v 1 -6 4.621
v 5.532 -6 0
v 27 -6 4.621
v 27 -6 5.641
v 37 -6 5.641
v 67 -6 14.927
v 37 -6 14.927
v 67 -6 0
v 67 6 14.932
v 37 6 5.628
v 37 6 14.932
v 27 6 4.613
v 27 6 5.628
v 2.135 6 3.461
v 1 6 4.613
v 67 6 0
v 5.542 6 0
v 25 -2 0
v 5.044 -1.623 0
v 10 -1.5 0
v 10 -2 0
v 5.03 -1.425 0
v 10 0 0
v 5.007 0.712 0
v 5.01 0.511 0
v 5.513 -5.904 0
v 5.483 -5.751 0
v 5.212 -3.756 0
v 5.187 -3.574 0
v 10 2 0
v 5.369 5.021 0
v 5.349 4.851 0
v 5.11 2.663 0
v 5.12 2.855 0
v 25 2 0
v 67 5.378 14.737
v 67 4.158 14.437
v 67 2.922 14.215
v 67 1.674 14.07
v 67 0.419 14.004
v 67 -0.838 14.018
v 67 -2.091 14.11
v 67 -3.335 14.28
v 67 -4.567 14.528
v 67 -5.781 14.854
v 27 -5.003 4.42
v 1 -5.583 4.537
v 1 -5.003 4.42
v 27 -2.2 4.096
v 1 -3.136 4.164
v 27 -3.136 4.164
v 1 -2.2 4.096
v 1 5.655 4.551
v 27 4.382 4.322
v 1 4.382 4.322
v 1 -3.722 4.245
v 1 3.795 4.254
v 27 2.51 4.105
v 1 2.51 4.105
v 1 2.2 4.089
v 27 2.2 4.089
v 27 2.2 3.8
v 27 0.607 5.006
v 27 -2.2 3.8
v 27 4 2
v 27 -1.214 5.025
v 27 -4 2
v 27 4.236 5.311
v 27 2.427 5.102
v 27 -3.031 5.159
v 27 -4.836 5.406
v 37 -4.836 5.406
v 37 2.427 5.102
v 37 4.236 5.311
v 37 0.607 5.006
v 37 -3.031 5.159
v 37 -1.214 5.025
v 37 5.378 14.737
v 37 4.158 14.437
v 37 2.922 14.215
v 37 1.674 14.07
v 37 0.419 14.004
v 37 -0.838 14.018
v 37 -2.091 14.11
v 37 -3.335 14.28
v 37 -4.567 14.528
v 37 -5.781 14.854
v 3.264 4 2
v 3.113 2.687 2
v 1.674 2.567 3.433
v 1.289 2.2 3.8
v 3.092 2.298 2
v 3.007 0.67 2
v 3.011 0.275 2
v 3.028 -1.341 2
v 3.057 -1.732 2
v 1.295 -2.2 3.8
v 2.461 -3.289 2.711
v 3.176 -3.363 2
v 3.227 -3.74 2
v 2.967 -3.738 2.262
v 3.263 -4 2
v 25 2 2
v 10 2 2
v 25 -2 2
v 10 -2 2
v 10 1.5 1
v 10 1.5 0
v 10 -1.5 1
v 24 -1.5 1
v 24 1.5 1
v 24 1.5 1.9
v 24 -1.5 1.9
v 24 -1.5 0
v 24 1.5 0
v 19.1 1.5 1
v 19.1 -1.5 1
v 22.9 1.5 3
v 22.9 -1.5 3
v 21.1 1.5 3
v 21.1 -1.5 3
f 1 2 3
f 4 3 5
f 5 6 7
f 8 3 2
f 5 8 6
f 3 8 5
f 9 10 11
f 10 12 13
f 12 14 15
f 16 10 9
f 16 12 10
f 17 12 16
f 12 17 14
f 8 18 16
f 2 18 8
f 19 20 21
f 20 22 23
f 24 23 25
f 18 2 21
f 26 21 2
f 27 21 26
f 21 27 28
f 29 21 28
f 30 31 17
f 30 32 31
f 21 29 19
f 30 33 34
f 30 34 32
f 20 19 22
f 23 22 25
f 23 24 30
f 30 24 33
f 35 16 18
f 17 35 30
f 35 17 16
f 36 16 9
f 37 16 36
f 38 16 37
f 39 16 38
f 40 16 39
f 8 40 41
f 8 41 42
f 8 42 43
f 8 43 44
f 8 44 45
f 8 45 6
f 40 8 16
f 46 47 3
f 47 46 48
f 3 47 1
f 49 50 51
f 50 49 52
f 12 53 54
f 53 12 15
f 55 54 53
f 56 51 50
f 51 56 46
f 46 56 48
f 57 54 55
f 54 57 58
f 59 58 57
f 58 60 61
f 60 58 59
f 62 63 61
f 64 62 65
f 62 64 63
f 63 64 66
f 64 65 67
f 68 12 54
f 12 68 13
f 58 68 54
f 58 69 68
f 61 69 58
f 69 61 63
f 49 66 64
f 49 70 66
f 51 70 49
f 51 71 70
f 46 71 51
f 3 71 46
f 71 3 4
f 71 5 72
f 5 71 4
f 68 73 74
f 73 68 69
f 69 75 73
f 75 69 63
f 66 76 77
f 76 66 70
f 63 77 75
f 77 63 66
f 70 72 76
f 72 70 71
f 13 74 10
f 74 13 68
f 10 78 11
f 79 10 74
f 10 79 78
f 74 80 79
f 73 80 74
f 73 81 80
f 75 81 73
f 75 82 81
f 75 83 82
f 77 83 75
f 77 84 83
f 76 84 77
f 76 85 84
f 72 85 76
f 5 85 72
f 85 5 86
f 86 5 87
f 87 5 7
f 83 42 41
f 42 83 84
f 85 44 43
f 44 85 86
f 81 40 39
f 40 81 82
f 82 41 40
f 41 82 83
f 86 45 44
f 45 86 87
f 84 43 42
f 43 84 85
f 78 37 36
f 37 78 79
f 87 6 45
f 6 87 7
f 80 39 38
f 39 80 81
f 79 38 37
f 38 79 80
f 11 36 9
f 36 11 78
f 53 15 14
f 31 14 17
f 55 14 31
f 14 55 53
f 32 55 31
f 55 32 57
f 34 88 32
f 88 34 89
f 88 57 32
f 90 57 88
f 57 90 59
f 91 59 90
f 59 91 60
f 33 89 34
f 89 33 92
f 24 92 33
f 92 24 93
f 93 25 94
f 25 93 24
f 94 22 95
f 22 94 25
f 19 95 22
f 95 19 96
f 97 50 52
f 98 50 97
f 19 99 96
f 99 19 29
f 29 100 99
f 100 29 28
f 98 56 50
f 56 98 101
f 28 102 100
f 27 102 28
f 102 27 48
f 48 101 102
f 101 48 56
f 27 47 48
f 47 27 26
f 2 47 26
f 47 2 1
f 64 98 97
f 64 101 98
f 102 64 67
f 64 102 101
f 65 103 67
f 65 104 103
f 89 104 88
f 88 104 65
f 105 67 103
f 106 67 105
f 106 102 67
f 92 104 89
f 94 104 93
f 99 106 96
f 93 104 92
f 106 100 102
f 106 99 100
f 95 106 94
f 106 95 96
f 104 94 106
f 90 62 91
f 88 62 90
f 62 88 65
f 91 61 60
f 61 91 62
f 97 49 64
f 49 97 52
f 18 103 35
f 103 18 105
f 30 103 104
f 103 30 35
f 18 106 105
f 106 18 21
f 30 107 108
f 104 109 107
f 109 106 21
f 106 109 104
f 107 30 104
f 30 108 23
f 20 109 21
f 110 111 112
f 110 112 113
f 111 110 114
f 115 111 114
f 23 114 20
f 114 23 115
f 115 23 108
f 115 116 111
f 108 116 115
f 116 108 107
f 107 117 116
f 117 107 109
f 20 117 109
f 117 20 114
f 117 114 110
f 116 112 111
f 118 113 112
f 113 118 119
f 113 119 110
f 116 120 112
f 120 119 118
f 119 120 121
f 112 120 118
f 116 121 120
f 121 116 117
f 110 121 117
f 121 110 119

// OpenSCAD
// file: lib/camfer.scad
function reverse_list(list) = [ for (idx = [len(list) - 1 : -1 : 0]) list[idx] ];
function xmirror(list) = [ for ( e = list ) [-e[0], e[1]]];
function back_and_forth(list) = concat(list, reverse_list(xmirror(list)));


module circular_shape_camfer(radius, shape) {
	rotate_extrude($fn=100)
	translate([radius,0,0])
	polygon(shape);
}

module circular_camfer(radius, camfing, style, width = 10, height=10) {
	if (style == "circular") {
		difference () {
			translate([0,0,-30])
				cylinder(r = radius + camfing+30, h=camfing+30, $fn=100);
			translate([0,0,-31])
				cylinder(r = radius, h=camfing+32, $fn=100);
			translate([0,0,camfing])
				rotate_extrude($fn=100)
				translate([radius,0,0])
				circle(r=camfing, $fn=32);
		}
	}

	if (style == "triangular") {
		rotate_extrude($fn=100)
			translate([radius,0,0])
			rotate([0,0,-90-camfing])
			polygon([[-width,0],[width,0],[width,height],[-width,height]]);
	}
}
// file: lib/container.scad
use <threads.scad>;
use <camfer.scad>;


module lid(thread_height = 4) {
	difference () {
		union() {
			translate([0,0,1])
            difference() {
				metric_thread (diameter=55, pitch=2, length=thread_height+3, internal=false, n_starts=2);
                circular_camfer(25.5, 45, "triangular");
                translate([0,0,thread_height+3])
                circular_camfer(25.5, -45, "triangular");
            }
			cylinder(r=25.5, h=thread_height + 4, $fn=100);
		}

		translate([13,0,2])
			cylinder(r=10, h=thread_height + 3, $fn=100);
		rotate([0,0,120])
			translate([13,0,2])
			cylinder(r=10, h=thread_height + 3, $fn=100);
		rotate([0,0,-120])
			translate([13,0,2])
			cylinder(r=10, h=thread_height + 3, $fn=100);
	}
}


box();

module flange(inner_height = 30, thread_height = 4) {
	// Align to XY plane
	translate([0,0,34])
		rotate([0,90,0])
		rotate([0,0,-60])
	// The flange itself
	union() {
		difference() {
			// The stick
			rotate([0,0,-30])
				linear_extrude(height=inner_height+2+1+thread_height+40)
				translate([0,30,0])
				polygon(back_and_forth([[6,-20],[6,4]]));
	
			// Cutout for main housing
			translate([0,0,-1])
				cylinder(r=30, h=inner_height + 3 + thread_height + 1, $fn=100);
			// Cutout with room for lid
			translate([0,0,inner_height + 3 + thread_height - 1])
				cylinder(r=29, h=11, $fn=100);
			// Cutout for mast top
			translate([0,0,inner_height + 3 + thread_height + 10 - 1])
				cylinder(r=20, h=32, $fn=100);
			// Pretty at the bottom
			circular_camfer(radius=29, camfing=45, style="triangular");
	
			rotate([0,0,-30])
				linear_extrude(height=inner_height+2+1+thread_height)
				translate([0,30,0])
				polygon(back_and_forth([[2.2,-1],[2.2,0.2],[4,2]]));
	
			rotate([0,0,-30])
				translate([-2,34.5,inner_height+2 +3 -15])				
				rotate([90,0,0])
				linear_extrude(height=3)
				square([4,15]);
		}
	
		// Small flange for notch
		rotate([0,0,-30])
			translate([-1.5,34,inner_height+2 +3 -15])				
			rotate([90,0,0])
			linear_extrude(height=1)
			square([3,14]);
					
		// Notch
		rotate([0,0,60])
			translate([0,0,inner_height+2])			
			rotate([90,0,0])
			translate([30,0,0])
			linear_extrude(height=3, center=true)
			polygon([[1,-0.9], [1,0.9], [2.1,2], [3, 2], [3,-2.9]]);
	}
}

module box(inner_height = 30, thread_height = 4) {

nookCrossSection = [[0.5,0.5], [3,3], [3,-3], [0.5,-0.5]];

union() {
	difference() {
		union() {
			difference() {
			union() {
				rotate([0,0,-30])
				linear_extrude(height=inner_height+2+1+thread_height)
					translate([0,30,0])
					polygon(back_and_forth([[1,-1],[3.8,1.8],[3.8,2]]));
				rotate([0,0,90])
				linear_extrude(height=inner_height+2+1+thread_height)
					translate([0,30,0])
					polygon(back_and_forth([[1,-1],[3.8,1.8],[3.8,2]]));
				rotate([0,0,210])
				linear_extrude(height=inner_height+2+1+thread_height)
					translate([0,30,0])
					polygon(back_and_forth([[1,-1],[3.8,1.8],[3.8,2]]));
			}
				
			rotate([0,0,60])
				translate([0,0,inner_height+2])			
				rotate([90,0,0])
				translate([30,0,0])
				linear_extrude(height=4, center=true)
				polygon(nookCrossSection);
			rotate([0,0,-60])
				translate([0,0,inner_height+2])			
				rotate([90,0,0])
				translate([30,0,0])
				linear_extrude(height=4, center=true)
				polygon(nookCrossSection);
			rotate([0,0,180])
				translate([0,0,inner_height+2])			
				rotate([90,0,0])
				translate([30,0,0])
				linear_extrude(height=4, center=true)
				polygon(nookCrossSection);
		}
			
			difference() {
				translate([29,0,0])
				linear_extrude(height = min(10,inner_height) + 2)
				polygon([[0,-2],[0,2],[2.5,0]]);
				translate([0,0,min(10,inner_height)+2])
				rotate([180,0,0])
				circular_camfer(radius=30, camfing=45, style="triangular");
			}
		}
		
		circular_camfer(radius=29, camfing=45, style="triangular");
		translate([0,0,inner_height+2+1+thread_height])
			rotate([180,0,0])
			circular_camfer(radius=30, camfing=60, style="triangular");
	}
}

difference() {
    union() {
difference() {
cylinder(r=30, h=inner_height + 3 + thread_height, $fn=100);
    translate([0,0,2])
cylinder(r=28, h=inner_height+1, $fn=100);
translate([0, 0, inner_height+2])
metric_thread (diameter=55, pitch=2, length=thread_height+2, internal=true, n_starts=2);
		circular_camfer(radius=29, camfing=45, style="triangular");
}
translate([-5,-5,0])
        cube([10,10,4], center=false);
    }
rotate([0,0,45])
translate([0, -2.5, -0.5])
    cylinder(r=1,h=5,$fn=6);
rotate([0,0,45])
translate([0, 2.5, -0.5])
    cylinder(r=1,h=5,$fn=6);
}


translate([0,0,inner_height - 1])
difference() {
cylinder(r=28, h=3, $fn=100);
translate([0,0,-3])
cylinder(r1=30, r2=24, h=9, $fn=100);
}
}
// main file
use <lib/container.scad>;

flange( inner_height = 20, thread_height = 4 );
